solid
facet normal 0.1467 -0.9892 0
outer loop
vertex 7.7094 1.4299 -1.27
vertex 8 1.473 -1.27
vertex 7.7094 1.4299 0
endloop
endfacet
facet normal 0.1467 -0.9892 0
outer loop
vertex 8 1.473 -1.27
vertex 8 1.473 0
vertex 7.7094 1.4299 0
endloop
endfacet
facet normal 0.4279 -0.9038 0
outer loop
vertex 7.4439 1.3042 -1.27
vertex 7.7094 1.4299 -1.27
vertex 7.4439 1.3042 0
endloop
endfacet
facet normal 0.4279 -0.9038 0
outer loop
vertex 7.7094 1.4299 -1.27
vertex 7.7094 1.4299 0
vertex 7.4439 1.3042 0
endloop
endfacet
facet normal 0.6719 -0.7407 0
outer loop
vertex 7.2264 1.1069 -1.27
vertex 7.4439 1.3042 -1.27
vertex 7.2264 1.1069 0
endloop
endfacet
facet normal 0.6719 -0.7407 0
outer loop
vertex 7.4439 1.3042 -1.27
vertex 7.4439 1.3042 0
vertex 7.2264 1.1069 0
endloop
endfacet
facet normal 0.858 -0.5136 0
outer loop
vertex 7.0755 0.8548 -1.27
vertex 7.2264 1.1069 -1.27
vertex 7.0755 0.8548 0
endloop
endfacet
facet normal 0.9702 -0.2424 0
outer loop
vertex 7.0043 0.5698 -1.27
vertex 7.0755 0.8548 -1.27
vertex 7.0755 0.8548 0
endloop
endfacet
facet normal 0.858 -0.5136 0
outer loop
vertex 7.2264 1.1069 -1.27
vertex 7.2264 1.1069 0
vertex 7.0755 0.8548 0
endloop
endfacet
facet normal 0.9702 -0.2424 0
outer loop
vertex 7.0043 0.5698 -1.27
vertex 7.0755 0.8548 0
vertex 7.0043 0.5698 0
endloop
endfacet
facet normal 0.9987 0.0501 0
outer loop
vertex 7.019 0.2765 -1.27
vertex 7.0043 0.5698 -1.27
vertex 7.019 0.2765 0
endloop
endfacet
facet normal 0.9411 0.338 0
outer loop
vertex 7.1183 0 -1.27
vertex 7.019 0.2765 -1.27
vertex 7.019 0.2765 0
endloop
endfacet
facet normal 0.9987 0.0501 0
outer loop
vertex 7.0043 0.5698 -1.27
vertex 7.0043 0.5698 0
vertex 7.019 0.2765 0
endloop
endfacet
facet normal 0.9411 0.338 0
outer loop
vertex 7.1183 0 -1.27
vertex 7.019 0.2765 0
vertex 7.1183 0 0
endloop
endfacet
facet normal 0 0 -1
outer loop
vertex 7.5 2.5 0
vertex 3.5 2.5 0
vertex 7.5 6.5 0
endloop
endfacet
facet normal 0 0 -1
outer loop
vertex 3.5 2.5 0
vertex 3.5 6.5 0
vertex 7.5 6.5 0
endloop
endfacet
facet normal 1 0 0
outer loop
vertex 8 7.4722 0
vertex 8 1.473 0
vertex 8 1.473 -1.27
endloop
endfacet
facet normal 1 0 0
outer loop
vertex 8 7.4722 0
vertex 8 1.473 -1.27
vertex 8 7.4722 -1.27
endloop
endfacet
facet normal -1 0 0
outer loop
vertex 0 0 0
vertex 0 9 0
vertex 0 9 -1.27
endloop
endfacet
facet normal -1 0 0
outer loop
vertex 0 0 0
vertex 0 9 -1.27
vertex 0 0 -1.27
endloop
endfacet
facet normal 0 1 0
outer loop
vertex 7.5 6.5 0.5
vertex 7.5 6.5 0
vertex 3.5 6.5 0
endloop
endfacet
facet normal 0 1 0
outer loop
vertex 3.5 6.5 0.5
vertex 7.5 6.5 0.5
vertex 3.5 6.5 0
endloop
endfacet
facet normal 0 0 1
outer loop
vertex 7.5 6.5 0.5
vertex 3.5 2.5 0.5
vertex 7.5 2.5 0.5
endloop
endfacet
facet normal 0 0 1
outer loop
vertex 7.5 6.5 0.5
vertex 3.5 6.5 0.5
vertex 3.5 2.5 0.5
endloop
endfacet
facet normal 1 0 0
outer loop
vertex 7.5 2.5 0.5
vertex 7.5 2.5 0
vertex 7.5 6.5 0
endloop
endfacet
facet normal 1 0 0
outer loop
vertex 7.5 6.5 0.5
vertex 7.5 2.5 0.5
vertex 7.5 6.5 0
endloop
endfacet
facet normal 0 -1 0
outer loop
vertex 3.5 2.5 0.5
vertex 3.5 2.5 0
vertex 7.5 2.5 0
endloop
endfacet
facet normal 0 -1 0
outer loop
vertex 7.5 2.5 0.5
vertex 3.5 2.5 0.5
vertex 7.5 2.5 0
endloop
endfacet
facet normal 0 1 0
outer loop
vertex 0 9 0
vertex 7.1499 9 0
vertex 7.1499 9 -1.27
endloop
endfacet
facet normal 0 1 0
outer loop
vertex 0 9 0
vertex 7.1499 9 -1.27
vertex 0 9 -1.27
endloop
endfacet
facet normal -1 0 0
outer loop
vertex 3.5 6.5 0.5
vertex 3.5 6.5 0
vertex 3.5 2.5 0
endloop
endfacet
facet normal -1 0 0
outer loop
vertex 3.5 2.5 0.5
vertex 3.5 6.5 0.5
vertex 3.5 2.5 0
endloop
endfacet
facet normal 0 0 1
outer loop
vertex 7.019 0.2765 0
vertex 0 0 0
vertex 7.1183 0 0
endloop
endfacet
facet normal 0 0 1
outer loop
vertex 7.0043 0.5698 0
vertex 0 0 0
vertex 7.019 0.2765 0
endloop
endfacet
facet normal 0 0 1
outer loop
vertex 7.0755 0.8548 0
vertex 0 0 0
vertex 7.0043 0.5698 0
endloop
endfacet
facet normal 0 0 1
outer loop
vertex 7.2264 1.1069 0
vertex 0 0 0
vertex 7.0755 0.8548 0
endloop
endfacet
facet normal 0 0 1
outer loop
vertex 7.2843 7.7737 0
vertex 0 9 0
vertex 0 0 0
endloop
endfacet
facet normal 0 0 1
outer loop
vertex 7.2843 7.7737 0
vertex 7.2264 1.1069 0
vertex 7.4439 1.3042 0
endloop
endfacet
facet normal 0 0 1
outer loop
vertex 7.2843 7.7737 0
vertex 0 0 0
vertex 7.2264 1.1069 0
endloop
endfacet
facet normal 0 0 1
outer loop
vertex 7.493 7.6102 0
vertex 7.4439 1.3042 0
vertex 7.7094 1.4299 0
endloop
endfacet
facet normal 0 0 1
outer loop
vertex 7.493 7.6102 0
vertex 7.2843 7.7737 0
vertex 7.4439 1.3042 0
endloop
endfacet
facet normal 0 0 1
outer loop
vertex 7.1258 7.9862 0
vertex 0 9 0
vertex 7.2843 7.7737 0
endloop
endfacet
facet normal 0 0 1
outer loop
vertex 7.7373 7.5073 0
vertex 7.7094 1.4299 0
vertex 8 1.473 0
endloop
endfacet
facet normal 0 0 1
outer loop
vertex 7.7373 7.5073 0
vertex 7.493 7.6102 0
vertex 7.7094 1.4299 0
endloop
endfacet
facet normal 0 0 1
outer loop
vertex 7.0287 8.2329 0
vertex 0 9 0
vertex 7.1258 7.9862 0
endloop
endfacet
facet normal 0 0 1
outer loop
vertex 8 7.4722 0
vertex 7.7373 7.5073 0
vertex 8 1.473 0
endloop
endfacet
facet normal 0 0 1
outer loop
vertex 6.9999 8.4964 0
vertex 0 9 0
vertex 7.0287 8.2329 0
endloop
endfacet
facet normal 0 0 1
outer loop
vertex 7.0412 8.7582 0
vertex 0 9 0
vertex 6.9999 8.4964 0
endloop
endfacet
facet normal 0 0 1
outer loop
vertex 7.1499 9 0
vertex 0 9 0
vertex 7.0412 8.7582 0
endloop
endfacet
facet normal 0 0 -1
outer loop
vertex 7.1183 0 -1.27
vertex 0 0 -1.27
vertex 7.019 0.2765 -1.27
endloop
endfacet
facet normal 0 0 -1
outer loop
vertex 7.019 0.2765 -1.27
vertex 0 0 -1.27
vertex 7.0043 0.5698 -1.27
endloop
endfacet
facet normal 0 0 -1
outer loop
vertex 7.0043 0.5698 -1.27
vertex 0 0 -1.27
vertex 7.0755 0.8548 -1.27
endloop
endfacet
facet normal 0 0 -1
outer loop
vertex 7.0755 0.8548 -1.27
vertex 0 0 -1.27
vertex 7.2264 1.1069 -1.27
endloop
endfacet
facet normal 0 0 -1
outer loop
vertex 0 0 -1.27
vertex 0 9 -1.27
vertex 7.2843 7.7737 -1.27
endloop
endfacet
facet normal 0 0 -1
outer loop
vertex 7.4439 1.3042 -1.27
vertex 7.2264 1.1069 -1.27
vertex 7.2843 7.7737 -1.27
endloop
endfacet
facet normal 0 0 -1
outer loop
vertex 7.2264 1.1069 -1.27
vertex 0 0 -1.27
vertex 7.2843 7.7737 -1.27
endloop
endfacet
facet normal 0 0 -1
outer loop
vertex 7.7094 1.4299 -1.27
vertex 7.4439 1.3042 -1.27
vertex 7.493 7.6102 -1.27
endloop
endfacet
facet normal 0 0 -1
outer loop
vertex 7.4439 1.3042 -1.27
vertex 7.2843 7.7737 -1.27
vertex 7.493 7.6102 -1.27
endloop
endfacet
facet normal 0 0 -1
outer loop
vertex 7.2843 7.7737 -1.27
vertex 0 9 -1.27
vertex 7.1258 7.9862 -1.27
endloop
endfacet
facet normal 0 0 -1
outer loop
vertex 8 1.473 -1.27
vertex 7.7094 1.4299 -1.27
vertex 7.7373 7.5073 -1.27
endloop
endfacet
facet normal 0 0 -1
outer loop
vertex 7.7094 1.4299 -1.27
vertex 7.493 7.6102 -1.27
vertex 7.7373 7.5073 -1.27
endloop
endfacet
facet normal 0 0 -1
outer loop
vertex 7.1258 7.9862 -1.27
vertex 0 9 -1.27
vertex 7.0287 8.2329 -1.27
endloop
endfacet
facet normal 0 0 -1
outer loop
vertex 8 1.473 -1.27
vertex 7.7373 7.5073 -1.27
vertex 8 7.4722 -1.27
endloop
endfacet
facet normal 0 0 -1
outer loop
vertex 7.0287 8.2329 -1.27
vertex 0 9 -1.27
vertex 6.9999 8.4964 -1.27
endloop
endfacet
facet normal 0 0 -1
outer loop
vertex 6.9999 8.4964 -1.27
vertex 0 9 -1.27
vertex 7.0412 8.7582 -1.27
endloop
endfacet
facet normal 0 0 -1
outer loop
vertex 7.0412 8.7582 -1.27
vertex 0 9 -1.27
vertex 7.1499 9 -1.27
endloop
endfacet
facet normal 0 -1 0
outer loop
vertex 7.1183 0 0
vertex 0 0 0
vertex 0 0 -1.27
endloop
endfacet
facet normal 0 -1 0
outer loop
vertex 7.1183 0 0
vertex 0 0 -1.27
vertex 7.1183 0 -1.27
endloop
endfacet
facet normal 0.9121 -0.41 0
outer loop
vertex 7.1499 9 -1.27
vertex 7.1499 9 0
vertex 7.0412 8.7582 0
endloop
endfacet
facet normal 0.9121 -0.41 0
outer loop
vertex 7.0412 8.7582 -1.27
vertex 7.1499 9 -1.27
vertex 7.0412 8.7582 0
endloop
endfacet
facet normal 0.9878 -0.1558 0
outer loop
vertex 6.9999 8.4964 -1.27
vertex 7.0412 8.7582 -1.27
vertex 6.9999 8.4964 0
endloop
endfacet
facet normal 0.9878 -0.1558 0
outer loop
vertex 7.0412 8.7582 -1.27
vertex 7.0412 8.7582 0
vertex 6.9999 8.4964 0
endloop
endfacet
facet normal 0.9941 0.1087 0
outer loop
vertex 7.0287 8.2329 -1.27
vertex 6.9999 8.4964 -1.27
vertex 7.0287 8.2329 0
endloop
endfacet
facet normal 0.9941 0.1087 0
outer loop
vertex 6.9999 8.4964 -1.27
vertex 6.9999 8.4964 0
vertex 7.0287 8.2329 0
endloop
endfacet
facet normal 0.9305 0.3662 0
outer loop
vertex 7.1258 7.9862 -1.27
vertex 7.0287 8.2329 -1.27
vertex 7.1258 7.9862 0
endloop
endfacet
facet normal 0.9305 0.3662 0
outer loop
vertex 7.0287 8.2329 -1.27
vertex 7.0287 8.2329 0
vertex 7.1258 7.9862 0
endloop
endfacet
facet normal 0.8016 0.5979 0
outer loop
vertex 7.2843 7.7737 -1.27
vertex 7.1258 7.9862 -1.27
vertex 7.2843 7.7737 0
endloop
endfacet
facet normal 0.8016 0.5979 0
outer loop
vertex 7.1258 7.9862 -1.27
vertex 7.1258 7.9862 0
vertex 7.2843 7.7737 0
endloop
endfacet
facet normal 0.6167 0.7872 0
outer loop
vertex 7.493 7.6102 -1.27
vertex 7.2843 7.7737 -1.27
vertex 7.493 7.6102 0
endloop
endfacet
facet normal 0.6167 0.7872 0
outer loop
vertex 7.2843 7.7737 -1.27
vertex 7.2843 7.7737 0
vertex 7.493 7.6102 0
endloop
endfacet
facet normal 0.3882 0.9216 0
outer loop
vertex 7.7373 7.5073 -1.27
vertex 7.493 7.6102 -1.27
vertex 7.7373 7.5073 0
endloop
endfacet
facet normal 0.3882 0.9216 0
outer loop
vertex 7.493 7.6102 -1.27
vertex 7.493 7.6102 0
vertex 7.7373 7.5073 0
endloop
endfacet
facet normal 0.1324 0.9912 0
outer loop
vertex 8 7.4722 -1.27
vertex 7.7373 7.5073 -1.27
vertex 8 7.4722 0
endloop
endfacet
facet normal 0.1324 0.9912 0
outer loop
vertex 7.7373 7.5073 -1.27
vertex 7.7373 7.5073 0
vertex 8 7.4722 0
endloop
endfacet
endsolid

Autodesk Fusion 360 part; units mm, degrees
sketch "Esquisse1" plane through (0, 0, 0) normal (0, 0, 1) x (1, 0, 0)
  line L0 (0, 0) -> (8, 0)
  line L1 (8, 0) -> (8, 9)
  line L2 (8, 9) -> (0, 9)
  line L3 (0, 9) -> (0, 0)
  circle A0 centre (8, 8.4726) radius 1.0004
  circle A1 centre (8, 0.4726) radius 1.0004
  line L4 (8, 4.5) -> (0, 4.5) construction
  line L5 (7.5, 6.5) -> (3.5, 6.5)
  line L6 (3.5, 6.5) -> (3.5, 2.5)
  line L7 (3.5, 2.5) -> (7.5, 2.5)
  line L8 (7.5, 2.5) -> (7.5, 6.5)
  dimension "d1" = 8
  dimension "d2" = 9
  dimension "d3" = 4
  dimension "d4" = 4
extrude "Extrusion1" add sketch "Esquisse1" against normal blind 1.27 contours L0 L1 L2 L3 A0 A1 | L5 L6 L7 L8 makes body 1
extrude "Extrusion2" add sketch "Esquisse1" along normal blind 0.5 separate body contours L5 L6 L7 L8 makes body 2
